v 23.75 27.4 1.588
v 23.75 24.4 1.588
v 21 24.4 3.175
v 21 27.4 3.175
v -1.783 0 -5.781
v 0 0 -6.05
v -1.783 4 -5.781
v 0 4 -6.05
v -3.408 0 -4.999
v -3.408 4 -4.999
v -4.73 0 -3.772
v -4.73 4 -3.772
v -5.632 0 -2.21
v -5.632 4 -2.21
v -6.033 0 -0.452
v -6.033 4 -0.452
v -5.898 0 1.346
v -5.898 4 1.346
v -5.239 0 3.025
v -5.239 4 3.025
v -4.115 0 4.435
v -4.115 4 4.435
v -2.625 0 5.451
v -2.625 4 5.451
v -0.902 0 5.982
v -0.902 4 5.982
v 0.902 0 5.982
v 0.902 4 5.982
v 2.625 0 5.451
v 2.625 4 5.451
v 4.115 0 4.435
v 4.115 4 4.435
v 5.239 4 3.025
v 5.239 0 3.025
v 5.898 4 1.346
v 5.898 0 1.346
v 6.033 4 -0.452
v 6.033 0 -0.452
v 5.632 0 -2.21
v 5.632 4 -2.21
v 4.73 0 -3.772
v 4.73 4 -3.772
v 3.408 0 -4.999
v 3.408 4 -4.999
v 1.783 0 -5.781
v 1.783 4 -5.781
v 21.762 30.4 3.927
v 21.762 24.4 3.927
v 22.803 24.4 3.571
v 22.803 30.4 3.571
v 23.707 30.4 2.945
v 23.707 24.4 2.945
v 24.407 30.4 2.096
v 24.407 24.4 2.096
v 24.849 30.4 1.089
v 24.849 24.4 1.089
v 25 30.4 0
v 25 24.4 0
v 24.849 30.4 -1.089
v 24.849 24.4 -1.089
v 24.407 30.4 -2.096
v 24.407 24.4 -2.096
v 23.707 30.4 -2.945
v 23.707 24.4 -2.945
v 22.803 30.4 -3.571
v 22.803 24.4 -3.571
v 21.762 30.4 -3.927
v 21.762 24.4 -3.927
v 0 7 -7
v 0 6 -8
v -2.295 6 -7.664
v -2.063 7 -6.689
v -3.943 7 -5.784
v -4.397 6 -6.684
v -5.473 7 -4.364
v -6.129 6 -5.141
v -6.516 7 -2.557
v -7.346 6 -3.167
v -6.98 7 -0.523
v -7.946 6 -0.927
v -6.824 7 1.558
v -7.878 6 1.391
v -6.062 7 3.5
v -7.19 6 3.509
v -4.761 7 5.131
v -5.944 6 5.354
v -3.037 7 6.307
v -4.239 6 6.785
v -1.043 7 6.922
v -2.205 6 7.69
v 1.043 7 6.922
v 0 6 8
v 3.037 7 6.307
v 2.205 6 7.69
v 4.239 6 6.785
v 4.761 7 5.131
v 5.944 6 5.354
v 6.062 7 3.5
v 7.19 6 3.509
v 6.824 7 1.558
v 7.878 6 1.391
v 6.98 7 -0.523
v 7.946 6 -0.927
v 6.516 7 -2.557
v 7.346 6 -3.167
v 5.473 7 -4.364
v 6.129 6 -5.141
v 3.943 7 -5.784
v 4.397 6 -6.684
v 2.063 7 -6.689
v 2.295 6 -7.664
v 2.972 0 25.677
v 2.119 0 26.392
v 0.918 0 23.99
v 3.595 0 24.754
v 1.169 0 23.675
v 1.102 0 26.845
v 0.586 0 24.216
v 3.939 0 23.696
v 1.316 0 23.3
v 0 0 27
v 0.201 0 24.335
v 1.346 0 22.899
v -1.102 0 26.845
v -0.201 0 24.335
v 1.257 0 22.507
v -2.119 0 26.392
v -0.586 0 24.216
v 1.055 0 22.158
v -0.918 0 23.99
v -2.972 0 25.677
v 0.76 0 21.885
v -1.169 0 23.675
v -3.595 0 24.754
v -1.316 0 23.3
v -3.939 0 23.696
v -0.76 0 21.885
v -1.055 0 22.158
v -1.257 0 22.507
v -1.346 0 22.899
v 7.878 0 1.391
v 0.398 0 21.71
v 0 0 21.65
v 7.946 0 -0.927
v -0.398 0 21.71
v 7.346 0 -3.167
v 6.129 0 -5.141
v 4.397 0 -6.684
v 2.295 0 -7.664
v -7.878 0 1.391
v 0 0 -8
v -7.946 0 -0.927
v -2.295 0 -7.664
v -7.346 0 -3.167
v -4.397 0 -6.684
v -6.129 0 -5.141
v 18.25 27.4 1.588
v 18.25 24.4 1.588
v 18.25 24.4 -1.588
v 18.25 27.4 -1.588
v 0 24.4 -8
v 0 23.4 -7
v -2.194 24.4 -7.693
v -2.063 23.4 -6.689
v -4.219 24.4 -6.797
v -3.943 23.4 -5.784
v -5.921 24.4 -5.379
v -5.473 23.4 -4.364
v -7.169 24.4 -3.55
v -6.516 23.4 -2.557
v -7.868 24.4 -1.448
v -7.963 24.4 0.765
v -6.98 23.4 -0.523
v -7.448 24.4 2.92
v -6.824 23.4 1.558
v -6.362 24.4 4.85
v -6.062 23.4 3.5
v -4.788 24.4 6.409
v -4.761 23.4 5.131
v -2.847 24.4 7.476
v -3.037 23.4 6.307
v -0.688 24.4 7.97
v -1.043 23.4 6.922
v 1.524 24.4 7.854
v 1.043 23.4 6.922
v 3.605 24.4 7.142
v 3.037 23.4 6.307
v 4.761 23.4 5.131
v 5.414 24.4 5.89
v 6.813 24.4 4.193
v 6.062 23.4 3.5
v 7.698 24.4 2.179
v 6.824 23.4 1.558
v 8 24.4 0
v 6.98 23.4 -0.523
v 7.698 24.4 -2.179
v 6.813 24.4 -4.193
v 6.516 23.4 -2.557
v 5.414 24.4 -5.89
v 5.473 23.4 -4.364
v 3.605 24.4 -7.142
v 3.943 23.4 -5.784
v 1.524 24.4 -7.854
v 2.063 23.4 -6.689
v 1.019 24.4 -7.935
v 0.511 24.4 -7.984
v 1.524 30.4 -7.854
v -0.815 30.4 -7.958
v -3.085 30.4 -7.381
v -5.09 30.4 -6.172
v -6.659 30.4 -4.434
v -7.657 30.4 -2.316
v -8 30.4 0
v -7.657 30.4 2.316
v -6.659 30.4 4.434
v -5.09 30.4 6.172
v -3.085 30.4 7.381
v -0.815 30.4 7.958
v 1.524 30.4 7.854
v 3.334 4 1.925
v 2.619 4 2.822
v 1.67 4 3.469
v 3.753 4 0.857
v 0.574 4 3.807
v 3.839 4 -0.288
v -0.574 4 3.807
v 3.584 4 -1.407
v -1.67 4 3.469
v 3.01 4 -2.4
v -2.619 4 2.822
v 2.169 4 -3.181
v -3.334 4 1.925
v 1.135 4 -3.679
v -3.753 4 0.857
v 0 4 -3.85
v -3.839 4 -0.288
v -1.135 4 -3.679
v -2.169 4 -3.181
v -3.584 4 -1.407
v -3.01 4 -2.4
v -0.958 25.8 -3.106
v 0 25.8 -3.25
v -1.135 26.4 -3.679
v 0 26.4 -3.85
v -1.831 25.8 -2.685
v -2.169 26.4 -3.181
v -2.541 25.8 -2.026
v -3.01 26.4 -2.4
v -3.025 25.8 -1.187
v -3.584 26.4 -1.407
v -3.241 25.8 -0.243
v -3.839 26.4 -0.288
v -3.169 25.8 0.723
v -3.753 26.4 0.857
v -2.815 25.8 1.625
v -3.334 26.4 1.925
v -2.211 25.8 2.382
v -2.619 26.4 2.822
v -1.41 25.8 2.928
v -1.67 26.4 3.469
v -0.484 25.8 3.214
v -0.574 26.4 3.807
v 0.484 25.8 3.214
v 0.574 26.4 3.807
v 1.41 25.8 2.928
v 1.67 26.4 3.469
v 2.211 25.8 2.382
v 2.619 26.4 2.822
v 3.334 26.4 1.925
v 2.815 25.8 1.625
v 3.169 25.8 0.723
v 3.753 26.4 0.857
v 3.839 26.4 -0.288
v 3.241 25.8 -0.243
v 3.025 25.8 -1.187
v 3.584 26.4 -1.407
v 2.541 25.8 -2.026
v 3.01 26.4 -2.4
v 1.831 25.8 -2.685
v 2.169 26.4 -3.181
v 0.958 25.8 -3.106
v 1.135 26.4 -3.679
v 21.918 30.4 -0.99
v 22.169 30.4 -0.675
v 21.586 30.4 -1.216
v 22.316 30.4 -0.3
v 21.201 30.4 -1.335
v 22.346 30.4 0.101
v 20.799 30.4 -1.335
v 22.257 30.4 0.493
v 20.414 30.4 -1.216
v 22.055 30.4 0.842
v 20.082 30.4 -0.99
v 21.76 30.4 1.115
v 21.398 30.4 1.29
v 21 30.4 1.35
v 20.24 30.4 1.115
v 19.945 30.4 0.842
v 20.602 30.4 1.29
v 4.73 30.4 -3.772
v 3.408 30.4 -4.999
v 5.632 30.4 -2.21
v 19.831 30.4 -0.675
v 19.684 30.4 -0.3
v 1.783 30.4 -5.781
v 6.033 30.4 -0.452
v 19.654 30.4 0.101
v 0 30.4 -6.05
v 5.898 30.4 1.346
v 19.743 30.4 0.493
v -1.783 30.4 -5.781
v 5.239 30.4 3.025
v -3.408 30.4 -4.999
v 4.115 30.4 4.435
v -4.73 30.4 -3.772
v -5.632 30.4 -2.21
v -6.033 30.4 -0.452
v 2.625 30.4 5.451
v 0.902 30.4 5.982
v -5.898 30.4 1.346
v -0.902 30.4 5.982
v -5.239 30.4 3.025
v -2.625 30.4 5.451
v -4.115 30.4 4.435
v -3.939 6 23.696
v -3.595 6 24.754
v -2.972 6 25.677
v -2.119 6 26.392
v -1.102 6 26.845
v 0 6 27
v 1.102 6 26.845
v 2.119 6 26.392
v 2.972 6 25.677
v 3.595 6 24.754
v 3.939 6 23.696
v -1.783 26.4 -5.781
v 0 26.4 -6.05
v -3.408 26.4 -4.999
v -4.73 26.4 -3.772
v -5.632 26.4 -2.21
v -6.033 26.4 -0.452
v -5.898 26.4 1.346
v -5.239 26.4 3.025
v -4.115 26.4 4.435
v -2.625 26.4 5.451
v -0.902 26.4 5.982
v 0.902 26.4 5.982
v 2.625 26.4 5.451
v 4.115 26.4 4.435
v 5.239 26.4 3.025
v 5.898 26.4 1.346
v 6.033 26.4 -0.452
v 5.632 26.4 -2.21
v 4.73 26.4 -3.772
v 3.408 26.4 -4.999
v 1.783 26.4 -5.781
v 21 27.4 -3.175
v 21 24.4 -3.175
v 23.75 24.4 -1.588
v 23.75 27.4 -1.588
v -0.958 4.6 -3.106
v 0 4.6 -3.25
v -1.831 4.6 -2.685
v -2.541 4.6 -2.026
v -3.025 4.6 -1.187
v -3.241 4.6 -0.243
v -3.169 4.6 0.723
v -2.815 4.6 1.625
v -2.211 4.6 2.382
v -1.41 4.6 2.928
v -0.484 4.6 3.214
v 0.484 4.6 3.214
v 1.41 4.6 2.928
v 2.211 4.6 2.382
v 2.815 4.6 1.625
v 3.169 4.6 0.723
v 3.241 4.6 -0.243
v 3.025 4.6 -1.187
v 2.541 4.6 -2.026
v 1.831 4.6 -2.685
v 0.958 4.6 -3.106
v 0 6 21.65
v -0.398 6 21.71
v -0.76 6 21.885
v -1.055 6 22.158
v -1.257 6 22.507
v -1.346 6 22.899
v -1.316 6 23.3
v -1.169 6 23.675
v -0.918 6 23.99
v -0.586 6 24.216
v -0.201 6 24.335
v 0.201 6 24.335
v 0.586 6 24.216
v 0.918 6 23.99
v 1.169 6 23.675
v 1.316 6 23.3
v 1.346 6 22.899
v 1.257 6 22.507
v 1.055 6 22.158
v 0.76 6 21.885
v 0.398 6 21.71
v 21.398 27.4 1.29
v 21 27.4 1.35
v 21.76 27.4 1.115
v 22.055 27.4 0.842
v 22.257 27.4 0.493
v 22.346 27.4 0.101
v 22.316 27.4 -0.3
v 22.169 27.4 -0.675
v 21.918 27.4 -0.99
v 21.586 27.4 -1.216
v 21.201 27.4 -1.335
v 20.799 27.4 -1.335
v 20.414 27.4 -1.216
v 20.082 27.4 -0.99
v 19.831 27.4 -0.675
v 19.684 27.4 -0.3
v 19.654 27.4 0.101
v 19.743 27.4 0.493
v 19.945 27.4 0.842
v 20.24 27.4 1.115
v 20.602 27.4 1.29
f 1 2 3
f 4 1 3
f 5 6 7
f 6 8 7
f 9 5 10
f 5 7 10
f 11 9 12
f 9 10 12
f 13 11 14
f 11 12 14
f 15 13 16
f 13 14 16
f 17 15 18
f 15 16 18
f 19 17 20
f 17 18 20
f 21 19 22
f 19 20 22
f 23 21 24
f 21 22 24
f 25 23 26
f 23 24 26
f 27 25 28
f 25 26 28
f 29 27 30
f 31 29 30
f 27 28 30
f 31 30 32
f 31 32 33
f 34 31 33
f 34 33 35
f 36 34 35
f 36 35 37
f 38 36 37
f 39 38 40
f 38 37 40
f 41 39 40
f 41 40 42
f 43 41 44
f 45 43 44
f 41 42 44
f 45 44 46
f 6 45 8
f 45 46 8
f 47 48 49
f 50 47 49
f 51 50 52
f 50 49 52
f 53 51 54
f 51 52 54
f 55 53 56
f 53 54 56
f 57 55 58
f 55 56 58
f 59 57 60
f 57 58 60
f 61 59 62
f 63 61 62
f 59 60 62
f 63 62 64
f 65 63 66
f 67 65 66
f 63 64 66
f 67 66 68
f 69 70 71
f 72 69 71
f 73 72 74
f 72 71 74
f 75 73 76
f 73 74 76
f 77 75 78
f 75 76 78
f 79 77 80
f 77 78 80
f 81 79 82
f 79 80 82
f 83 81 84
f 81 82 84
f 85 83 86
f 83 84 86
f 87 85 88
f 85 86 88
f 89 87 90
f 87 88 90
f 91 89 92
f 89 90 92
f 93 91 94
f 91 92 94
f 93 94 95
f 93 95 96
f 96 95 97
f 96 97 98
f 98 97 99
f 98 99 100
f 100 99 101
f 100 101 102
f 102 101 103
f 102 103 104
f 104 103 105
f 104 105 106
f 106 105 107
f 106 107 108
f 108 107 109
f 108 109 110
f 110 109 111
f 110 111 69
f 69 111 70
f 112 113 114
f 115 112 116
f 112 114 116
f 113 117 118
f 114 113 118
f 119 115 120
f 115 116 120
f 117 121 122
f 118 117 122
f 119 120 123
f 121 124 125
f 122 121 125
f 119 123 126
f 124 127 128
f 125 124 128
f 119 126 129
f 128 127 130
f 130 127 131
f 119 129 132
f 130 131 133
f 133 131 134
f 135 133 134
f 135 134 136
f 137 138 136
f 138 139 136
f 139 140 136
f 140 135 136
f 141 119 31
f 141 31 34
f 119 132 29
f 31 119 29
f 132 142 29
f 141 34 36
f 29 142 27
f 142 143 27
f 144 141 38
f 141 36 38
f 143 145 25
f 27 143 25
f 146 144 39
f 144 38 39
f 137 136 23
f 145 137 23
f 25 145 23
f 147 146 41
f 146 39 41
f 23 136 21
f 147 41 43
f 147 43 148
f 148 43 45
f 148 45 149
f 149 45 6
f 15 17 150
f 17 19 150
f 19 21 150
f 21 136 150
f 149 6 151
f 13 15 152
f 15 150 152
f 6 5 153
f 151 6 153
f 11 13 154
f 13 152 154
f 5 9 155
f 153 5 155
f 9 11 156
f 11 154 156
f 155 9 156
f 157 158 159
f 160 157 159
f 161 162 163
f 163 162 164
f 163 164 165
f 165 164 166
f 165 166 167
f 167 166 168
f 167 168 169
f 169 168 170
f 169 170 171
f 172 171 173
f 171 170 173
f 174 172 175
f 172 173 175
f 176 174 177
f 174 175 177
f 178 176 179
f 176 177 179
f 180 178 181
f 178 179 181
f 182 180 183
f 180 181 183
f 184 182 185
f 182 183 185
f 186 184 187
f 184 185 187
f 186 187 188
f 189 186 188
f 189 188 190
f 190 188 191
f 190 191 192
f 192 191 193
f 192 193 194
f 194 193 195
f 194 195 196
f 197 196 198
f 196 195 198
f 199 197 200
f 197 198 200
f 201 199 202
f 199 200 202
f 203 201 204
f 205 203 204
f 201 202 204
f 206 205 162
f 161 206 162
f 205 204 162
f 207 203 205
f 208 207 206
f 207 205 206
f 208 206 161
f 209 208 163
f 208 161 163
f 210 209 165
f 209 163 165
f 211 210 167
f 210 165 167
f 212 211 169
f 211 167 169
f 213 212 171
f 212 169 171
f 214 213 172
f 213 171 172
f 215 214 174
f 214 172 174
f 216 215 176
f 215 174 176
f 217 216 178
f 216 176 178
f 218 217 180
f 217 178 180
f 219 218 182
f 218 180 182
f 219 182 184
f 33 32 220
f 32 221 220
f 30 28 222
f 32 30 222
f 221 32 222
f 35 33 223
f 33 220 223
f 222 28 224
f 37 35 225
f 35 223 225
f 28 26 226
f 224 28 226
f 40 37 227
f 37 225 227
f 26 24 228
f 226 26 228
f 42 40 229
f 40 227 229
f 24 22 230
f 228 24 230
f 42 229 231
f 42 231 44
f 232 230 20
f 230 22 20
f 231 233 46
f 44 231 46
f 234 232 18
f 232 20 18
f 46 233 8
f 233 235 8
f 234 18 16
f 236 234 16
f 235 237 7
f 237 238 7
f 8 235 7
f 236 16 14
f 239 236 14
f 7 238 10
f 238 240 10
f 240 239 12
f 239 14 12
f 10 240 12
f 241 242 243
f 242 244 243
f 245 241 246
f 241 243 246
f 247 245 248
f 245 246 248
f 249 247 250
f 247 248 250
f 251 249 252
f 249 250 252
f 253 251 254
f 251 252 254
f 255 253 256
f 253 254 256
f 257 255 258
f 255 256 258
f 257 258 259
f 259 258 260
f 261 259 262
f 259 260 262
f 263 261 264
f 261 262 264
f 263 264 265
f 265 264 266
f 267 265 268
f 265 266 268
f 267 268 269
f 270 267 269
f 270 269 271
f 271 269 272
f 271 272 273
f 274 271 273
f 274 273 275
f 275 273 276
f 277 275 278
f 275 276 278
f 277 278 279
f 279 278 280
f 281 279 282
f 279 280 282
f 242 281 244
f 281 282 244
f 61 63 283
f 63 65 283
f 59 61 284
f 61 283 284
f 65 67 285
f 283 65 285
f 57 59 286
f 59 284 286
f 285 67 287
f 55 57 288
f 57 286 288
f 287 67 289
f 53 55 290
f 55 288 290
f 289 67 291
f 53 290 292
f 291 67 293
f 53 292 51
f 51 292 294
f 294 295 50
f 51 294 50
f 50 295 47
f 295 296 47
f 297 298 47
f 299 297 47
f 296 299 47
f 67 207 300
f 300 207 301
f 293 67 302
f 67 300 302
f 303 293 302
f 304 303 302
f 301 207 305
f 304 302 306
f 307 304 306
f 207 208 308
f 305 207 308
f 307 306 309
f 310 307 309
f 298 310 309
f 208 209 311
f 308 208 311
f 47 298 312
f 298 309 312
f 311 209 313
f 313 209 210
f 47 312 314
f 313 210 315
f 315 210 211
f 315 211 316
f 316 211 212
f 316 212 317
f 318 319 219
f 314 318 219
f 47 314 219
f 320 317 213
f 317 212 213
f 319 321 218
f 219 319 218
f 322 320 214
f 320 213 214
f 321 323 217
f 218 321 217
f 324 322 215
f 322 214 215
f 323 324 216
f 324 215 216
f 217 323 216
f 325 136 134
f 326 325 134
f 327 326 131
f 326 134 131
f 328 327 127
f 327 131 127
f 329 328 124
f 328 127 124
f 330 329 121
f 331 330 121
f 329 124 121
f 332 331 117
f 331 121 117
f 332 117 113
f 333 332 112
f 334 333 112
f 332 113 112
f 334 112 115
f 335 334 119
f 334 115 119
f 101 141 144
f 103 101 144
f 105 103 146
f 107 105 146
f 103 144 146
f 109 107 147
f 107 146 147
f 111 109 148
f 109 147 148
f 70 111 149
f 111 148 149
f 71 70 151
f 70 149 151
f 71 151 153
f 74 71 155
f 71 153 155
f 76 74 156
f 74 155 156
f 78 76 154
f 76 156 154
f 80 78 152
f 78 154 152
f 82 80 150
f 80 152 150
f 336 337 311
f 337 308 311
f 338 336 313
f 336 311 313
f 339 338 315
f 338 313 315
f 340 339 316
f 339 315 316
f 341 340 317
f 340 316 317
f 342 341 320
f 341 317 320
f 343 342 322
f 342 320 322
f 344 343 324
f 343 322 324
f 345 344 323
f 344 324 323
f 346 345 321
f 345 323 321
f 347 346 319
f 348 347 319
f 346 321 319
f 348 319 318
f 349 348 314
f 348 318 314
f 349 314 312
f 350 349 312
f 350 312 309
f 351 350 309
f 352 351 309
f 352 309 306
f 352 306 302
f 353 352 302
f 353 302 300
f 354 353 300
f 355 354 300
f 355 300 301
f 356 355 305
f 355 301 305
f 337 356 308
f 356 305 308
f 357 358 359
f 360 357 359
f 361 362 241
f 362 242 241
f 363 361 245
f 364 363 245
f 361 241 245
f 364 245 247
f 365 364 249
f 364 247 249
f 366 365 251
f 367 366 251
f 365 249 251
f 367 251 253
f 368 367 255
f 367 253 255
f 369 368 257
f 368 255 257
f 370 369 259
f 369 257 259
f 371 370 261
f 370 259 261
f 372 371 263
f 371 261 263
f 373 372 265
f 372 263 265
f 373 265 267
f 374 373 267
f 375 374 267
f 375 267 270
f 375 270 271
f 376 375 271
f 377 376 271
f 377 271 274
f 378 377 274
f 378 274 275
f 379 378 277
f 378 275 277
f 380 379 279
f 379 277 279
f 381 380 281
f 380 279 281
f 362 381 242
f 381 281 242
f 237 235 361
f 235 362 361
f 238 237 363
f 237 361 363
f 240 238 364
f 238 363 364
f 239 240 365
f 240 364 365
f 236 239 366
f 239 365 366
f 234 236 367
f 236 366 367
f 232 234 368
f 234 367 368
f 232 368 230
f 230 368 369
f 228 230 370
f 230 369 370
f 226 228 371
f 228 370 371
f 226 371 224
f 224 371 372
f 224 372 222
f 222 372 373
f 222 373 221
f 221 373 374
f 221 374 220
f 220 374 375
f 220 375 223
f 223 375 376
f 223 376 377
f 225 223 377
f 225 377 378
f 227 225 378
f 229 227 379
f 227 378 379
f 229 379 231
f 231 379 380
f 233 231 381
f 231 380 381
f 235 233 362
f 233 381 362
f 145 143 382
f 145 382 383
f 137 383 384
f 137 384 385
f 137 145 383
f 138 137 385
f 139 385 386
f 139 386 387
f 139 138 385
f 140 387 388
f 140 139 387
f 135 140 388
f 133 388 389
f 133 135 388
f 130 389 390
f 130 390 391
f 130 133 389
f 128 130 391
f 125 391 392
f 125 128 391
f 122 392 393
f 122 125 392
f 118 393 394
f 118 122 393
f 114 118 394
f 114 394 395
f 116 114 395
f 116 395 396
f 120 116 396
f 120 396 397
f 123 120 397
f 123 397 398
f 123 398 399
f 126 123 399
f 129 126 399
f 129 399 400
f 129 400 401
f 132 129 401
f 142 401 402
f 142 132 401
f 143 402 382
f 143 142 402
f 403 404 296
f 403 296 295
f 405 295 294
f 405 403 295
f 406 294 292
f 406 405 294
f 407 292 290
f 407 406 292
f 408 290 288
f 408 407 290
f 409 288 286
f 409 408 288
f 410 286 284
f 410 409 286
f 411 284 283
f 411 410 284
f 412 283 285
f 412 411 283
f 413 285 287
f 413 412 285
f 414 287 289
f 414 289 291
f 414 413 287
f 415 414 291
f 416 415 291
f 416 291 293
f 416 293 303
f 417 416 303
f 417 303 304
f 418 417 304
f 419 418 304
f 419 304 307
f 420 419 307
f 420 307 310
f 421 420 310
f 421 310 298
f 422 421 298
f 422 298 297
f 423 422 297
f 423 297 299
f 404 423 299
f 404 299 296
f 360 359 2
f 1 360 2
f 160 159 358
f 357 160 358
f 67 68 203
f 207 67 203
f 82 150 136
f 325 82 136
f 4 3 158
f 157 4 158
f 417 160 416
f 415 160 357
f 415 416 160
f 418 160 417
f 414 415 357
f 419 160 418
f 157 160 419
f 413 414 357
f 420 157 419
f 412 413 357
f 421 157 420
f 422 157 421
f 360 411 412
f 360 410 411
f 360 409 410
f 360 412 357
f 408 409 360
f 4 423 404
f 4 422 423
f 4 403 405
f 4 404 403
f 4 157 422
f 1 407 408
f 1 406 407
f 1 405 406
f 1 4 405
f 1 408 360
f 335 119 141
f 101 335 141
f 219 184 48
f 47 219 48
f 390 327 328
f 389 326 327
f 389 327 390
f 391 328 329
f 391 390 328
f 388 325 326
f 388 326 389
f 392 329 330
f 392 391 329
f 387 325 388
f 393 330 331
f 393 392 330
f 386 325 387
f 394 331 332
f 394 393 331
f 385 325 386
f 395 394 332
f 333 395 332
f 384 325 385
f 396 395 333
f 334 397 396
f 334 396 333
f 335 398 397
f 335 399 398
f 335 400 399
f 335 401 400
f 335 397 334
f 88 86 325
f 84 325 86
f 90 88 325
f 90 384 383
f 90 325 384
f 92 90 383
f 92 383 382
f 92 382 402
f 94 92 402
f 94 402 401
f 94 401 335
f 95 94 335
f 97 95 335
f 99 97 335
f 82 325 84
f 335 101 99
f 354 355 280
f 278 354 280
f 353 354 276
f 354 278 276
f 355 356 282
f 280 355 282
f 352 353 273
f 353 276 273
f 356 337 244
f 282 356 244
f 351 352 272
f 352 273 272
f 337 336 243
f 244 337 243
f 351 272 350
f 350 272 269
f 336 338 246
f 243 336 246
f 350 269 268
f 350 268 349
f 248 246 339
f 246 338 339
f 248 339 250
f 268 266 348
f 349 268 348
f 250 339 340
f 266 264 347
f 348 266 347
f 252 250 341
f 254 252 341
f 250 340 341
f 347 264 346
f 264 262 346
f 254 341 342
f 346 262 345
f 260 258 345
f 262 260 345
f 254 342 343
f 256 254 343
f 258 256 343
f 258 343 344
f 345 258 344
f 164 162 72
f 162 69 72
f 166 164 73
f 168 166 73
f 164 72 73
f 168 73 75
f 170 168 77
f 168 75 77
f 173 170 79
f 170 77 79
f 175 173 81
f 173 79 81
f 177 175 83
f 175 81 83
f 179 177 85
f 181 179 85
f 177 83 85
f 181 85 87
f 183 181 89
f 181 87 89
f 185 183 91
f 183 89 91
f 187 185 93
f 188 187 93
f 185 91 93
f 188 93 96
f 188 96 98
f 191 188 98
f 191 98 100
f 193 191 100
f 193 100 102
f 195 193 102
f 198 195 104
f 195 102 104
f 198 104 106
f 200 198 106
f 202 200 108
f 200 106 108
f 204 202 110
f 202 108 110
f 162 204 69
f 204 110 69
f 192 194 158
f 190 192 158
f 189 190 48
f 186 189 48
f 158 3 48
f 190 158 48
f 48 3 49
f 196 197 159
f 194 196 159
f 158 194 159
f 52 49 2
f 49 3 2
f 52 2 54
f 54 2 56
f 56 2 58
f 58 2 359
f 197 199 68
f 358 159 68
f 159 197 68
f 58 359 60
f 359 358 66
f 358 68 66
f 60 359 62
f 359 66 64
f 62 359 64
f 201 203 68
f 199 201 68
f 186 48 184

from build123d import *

# Parameters (mm, degrees)
ESQUISSE2_R             = 1.35
BOSS_EXTRU_2_DEPTH      = 6
BOSS_EXTRU_3_START      = -6
ESQUISSE3_R             = 1.35
BOSS_EXTRU_3_DEPTH      = 6
ENL_V_MAT_EXTRU_1_DEPTH = 3


with BuildPart() as part:
    # Esquisse1 → Révolution1 (revolve)
    with BuildSketch(Plane.XY, mode=Mode.PRIVATE) as r_volution1_sk:
        Polygon((-6.05, 0), (-6.05, 4), (-3.85, 4), (-3.25, 4.6), (-3.25, 25.8), (-3.85, 26.4), (-6.05, 26.4), (-6.05, 30.4), (-8, 30.4), (-8, 24.4), (-7, 23.4), (-7, 7), (-8, 6), (-8, 0), align=None)
    revolve(r_volution1_sk.sketch.rotate(Axis((0, 0, 0), (0, 1, 0)), 270), axis=Axis((0, 0, 0), (0, 1, 0)))

    # Esquisse2 → Boss.-Extru.2 (add)
    with BuildSketch(Plane(origin=(0, 0, 0), x_dir=(1, 0, 0), z_dir=(0, 1, 0))):
        with BuildLine():
            Line((-7.878088106, -1.391304348), (-3.939044053, -23.695652174))
            ThreePointArc((-3.939044053, -23.695652174), (0, -27), (3.939044053, -23.695652174))
            Line((3.939044053, -23.695652174), (7.878088106, -1.391304348))
            ThreePointArc((7.878088106, -1.391304348), (0, -8), (-7.878088106, -1.391304348))
        make_face()
        with Locations(Location((0, -23, 0), (0, 0, 90))):
            Circle(ESQUISSE2_R, mode=Mode.SUBTRACT)
    extrude(amount=BOSS_EXTRU_2_DEPTH)

    # Esquisse3 → Boss.-Extru.3 (add)
    with BuildSketch(Plane(origin=(0, 30.4, 0), x_dir=(1, 0, 0), z_dir=(0, 1, 0)).offset(BOSS_EXTRU_3_START)):
        with BuildLine():
            Line((21.761904762, 3.926767262), (1.523809524, 7.853534525))
            ThreePointArc((1.523809524, 7.853534525), (8, 0), (1.523809524, -7.853534525))
            Line((1.523809524, -7.853534525), (21.761904762, -3.926767262))
            ThreePointArc((21.761904762, -3.926767262), (25, 0), (21.761904762, 3.926767262))
        make_face()
        with Locations(Location((21, 0, 0), (0, 0, 270))):
            Circle(ESQUISSE3_R, mode=Mode.SUBTRACT)
    extrude(amount=BOSS_EXTRU_3_DEPTH)

    # Esquisse4 → Enlèv. mat.-Extru.1 (cut)
    with BuildSketch(Plane.XZ.offset(-24.4)):
        Polygon((21, -3.175426481), (23.75, -1.58771324), (23.75, 1.58771324), (21, 3.175426481), (18.25, 1.58771324), (18.25, -1.58771324), align=None)
    extrude(amount=-ENL_V_MAT_EXTRU_1_DEPTH, mode=Mode.SUBTRACT)


solid = part.part
